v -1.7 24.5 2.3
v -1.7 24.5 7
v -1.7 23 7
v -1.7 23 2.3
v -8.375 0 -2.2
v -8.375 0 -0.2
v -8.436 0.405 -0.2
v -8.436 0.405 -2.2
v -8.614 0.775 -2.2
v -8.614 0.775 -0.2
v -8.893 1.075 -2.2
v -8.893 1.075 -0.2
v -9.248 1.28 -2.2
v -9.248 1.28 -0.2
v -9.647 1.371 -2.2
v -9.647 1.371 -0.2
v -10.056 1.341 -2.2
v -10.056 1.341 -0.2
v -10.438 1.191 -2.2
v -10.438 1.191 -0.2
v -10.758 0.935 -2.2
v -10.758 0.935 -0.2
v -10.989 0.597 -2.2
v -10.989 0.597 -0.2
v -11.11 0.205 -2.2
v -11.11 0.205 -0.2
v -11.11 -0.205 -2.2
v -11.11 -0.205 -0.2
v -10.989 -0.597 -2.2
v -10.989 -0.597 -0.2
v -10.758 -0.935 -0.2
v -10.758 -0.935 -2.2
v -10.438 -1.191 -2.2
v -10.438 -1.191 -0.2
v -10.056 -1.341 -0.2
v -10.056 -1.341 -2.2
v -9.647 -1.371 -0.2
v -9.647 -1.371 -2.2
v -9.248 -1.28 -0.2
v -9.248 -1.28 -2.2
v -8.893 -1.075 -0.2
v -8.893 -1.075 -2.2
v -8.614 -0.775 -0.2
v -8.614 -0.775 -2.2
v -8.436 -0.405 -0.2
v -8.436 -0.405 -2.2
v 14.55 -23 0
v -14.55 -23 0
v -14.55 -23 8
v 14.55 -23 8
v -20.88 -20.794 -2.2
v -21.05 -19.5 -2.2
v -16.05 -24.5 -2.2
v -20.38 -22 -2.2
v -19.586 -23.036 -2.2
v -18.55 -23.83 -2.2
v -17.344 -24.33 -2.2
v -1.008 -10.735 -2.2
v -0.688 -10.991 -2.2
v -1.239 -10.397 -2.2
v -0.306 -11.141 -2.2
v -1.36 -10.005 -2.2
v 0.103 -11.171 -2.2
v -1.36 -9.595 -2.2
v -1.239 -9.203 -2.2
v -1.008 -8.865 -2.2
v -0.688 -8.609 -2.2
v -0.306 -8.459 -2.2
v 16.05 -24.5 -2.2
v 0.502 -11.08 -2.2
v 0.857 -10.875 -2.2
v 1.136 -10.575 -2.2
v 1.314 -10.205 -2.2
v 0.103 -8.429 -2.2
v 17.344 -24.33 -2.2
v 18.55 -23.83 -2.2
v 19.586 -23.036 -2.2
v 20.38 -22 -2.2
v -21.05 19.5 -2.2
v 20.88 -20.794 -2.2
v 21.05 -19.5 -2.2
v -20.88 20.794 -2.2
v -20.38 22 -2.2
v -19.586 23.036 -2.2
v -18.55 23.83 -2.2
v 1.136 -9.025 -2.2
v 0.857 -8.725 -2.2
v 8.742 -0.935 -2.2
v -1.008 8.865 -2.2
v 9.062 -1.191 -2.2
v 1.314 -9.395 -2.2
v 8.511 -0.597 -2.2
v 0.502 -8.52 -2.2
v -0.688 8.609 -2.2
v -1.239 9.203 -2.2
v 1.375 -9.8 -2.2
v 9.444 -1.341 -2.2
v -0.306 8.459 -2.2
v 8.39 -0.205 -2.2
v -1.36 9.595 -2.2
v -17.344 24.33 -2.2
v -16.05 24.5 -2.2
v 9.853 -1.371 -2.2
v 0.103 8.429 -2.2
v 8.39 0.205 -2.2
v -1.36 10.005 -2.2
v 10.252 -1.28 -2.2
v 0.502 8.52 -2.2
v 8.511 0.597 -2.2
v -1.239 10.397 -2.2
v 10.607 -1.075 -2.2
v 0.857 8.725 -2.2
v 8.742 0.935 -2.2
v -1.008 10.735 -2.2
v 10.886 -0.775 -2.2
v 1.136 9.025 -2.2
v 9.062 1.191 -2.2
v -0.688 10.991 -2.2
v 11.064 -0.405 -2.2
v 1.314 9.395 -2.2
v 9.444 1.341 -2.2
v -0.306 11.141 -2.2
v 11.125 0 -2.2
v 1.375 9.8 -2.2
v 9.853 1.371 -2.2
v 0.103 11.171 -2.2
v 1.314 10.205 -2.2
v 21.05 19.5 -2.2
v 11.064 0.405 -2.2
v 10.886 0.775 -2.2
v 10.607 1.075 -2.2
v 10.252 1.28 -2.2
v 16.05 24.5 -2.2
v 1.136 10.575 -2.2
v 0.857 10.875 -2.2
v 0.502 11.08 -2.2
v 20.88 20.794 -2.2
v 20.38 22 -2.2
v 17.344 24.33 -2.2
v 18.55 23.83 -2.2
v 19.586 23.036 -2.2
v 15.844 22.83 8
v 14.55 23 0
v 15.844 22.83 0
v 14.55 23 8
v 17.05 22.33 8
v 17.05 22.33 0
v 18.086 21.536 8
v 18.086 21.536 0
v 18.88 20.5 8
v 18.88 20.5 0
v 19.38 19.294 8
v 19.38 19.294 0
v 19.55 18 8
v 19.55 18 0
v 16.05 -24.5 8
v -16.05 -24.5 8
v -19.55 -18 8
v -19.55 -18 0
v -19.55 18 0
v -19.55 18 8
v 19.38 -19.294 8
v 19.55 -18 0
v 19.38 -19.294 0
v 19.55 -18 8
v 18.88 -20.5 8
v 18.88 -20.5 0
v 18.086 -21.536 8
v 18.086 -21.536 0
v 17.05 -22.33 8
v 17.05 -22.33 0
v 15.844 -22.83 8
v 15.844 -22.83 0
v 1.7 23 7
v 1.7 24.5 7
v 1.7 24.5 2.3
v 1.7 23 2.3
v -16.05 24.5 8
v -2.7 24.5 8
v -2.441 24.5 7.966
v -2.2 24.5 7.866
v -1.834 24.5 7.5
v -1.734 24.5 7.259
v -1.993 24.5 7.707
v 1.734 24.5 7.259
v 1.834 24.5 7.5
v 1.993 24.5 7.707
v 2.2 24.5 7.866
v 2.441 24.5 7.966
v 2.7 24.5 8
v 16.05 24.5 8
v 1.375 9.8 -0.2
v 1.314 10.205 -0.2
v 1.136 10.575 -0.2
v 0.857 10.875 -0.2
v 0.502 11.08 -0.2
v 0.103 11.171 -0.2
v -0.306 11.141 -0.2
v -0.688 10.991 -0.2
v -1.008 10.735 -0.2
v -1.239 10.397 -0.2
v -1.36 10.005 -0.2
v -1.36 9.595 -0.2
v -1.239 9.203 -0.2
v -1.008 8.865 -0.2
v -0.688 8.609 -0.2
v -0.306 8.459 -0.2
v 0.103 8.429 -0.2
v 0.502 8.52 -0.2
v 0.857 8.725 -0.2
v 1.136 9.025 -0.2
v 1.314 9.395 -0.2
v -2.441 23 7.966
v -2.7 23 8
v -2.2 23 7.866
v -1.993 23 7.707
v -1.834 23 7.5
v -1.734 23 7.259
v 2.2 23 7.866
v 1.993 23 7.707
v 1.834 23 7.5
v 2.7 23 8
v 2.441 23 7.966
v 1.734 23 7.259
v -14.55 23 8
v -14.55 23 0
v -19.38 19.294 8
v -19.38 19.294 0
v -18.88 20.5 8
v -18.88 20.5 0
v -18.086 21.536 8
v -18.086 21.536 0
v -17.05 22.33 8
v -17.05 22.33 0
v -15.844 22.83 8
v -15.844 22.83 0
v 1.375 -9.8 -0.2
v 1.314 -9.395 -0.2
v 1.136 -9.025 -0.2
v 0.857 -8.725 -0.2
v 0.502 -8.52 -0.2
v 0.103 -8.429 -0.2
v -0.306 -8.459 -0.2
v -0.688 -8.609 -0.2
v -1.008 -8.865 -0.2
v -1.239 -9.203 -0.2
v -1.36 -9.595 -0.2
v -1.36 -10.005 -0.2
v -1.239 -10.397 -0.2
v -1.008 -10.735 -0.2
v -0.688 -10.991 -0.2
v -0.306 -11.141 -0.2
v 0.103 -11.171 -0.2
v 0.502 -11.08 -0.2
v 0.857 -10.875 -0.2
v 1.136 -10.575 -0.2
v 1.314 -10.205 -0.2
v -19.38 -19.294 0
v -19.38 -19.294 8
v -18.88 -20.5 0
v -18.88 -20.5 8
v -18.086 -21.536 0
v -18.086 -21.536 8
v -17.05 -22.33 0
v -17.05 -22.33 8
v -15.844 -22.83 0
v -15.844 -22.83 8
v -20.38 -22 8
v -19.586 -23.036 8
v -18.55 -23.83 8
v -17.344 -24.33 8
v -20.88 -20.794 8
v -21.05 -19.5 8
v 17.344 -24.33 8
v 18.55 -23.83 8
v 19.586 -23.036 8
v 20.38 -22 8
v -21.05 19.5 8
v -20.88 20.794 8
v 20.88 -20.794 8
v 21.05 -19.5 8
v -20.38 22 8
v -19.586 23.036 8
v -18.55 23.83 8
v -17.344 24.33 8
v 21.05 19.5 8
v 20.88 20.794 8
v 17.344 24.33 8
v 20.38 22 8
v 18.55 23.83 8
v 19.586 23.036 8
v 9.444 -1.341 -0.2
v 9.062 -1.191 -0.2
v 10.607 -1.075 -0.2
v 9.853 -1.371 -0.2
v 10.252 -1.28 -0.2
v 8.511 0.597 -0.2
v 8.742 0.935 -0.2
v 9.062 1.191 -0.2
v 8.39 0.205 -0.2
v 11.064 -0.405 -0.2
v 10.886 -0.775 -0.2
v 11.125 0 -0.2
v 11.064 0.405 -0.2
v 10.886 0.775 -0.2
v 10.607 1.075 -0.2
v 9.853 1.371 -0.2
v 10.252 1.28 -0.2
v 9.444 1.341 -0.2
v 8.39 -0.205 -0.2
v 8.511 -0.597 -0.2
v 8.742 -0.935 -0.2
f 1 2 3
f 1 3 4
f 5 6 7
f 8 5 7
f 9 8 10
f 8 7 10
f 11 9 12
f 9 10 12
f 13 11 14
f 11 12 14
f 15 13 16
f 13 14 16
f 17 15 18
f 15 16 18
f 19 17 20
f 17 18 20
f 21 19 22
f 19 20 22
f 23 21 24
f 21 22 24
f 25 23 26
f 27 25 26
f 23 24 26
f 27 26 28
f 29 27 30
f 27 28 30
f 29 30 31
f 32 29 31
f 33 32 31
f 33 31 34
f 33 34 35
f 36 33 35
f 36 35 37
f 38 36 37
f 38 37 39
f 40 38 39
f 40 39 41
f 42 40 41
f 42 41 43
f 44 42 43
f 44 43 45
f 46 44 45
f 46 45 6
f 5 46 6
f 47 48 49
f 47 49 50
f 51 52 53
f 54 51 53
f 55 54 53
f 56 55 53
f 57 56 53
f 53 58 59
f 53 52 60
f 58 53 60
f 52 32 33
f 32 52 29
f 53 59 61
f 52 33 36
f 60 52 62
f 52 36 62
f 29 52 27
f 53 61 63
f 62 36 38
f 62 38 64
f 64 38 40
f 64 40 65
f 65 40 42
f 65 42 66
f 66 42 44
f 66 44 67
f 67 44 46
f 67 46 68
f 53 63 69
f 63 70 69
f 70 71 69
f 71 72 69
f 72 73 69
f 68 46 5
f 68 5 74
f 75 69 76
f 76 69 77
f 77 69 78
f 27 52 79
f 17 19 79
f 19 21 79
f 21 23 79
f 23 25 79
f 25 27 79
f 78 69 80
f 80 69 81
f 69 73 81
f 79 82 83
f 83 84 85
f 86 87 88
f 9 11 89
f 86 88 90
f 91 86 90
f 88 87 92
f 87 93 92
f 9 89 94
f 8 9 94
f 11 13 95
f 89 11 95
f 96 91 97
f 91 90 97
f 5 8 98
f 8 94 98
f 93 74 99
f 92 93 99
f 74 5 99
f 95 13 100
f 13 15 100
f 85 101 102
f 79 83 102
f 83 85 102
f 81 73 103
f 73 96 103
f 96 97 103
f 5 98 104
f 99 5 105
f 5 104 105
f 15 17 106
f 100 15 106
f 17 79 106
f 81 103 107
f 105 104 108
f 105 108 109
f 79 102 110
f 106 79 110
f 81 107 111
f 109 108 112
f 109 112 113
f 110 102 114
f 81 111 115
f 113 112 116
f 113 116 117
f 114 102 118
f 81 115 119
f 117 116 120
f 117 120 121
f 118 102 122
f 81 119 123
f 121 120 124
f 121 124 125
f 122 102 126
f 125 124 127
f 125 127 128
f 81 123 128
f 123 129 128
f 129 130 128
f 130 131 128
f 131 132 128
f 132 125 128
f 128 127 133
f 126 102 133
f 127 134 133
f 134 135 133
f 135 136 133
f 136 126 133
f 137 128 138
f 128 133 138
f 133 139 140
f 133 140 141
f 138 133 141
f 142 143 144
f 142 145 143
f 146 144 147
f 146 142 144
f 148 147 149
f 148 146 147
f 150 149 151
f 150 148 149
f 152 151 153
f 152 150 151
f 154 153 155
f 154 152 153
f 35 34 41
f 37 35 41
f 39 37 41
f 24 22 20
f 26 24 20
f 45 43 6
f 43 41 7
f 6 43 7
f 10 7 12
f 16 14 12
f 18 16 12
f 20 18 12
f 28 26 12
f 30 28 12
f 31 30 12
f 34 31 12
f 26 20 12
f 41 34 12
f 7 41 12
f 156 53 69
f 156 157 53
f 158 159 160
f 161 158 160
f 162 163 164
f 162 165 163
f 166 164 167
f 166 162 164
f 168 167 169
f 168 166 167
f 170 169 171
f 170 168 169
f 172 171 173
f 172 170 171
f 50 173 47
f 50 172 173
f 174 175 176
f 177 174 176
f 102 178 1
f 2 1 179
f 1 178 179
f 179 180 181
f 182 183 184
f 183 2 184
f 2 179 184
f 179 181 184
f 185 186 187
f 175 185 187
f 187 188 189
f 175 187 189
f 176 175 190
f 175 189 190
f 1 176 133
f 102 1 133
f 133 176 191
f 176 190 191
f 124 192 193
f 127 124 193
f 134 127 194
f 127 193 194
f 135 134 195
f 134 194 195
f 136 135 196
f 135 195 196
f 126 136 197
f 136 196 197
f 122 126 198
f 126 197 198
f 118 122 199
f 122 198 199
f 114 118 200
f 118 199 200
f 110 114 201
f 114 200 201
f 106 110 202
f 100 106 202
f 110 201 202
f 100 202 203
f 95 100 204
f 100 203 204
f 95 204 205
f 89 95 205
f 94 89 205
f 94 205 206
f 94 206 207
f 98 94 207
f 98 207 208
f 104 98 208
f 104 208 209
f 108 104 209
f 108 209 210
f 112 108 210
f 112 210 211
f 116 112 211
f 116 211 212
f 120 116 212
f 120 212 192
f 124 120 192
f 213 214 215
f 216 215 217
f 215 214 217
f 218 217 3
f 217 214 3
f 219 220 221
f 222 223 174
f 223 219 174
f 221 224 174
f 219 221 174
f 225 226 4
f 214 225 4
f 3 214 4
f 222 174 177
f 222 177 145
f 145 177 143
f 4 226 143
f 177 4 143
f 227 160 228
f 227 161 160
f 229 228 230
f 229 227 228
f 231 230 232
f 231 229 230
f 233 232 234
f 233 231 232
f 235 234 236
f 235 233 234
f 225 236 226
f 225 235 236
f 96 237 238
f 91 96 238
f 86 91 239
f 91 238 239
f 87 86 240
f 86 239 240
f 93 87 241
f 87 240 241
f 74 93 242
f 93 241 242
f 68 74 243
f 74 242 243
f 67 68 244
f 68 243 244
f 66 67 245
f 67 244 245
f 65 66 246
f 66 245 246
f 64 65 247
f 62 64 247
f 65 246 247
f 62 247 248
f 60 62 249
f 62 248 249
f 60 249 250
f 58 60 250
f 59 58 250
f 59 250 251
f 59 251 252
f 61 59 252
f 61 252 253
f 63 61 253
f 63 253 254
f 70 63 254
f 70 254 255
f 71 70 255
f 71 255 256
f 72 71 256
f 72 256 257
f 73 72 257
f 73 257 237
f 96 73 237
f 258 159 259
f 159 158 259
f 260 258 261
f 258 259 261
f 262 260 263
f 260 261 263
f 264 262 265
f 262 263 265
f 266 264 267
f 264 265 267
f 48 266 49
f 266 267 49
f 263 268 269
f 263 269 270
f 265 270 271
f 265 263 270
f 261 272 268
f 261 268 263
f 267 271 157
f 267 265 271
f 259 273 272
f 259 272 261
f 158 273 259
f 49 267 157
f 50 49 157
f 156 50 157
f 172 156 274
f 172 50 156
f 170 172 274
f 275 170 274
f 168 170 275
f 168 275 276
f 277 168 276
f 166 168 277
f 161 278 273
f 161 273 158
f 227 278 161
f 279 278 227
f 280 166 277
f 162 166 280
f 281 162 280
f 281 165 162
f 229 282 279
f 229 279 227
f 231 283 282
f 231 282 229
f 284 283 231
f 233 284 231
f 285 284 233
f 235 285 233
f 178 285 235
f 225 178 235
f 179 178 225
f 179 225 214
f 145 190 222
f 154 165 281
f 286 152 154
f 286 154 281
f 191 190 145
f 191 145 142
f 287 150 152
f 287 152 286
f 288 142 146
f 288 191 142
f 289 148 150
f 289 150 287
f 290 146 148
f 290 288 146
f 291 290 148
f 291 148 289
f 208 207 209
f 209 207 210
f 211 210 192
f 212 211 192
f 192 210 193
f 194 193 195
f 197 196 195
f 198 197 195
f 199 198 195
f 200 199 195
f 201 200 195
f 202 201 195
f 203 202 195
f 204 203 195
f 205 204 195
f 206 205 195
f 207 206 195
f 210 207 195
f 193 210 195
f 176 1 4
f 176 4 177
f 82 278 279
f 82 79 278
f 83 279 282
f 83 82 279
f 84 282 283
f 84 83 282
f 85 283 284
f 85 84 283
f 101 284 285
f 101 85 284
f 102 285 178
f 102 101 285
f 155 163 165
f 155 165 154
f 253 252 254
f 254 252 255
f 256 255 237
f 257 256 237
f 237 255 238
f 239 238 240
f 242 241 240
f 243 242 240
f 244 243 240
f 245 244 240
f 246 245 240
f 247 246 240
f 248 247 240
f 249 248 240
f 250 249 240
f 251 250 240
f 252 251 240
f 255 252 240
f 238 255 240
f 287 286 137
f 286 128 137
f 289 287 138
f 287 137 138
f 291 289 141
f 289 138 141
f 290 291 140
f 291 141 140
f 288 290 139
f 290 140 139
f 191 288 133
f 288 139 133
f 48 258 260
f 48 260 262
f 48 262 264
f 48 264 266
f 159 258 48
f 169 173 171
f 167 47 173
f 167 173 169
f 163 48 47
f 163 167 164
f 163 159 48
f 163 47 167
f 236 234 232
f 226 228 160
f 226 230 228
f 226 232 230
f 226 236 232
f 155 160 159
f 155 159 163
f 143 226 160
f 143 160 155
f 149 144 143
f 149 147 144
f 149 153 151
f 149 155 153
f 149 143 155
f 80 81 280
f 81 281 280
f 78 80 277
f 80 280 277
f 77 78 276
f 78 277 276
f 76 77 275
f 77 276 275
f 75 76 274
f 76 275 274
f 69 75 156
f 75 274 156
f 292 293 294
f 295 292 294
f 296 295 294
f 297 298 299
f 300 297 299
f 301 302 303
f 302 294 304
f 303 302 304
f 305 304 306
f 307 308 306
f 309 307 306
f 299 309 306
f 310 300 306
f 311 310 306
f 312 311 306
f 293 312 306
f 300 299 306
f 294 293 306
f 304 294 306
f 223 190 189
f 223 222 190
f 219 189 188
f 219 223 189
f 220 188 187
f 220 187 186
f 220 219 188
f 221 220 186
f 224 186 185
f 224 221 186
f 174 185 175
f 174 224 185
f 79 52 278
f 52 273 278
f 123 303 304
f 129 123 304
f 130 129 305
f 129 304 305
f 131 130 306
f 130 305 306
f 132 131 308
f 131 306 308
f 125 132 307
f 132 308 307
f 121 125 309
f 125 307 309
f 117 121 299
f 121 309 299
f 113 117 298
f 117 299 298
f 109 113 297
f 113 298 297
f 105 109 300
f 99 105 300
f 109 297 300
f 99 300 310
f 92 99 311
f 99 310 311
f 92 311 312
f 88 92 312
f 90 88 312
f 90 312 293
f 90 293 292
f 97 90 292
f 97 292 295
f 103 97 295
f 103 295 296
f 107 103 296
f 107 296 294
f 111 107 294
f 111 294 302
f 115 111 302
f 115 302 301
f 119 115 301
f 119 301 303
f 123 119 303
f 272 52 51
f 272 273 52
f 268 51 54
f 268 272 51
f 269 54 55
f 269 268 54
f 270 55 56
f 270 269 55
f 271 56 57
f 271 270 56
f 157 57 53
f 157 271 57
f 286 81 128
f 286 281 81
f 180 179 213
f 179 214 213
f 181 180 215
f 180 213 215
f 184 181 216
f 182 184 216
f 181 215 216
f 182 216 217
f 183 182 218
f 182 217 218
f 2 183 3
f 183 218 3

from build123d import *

# Parameters (mm, degrees)
SKETCH1_W           = 42.1
SKETCH1_H           = 49
SKETCH1_W_2         = 39.1
SKETCH1_H_2         = 46
BOSS_EXTRUDE1_DEPTH = 8
SKETCH1_2_W         = 42.1
SKETCH1_2_H         = 49
BOSS_EXTRUDE2_DEPTH = 2.2
FILLET1_R           = 5
SKETCH2_W           = 3.4
SKETCH2_H           = 5.7
CUT_EXTRUDE1_DEPTH  = 1.5
FILLET2_R           = 1
SKETCH3_R           = 1.375
CUT_EXTRUDE2_DEPTH  = 2.2
SKETCH4_R           = 1.5
BOSS_EXTRUDE3_DEPTH = 0.2


with BuildPart() as part:
    # Sketch1 → Boss-Extrude1 (new body)
    with BuildSketch(Plane.XY):
        Rectangle(SKETCH1_W, SKETCH1_H)
        Rectangle(SKETCH1_W_2, SKETCH1_H_2, mode=Mode.SUBTRACT)
    extrude(amount=BOSS_EXTRUDE1_DEPTH)

    # Sketch1<2> → Boss-Extrude2 (add)
    with BuildSketch(Plane.XY):
        Rectangle(SKETCH1_2_W, SKETCH1_2_H)
    extrude(amount=-BOSS_EXTRUDE2_DEPTH)

    # Fillet1
    fillet1_edges = [part.edges().sort_by_distance(p)[0] for p in [
        (-19.55, 23, 4),
        (-19.55, -23, 4),
        (19.55, -23, 4),
        (19.55, 23, 4),
        (-21.05, 24.5, 2.9),
        (21.05, 24.5, 2.9),
        (21.05, -24.5, 2.9),
        (-21.05, -24.5, 2.9),
    ]]
    fillet(fillet1_edges, radius=FILLET1_R)

    # Sketch2 → Cut-Extrude1 (cut)
    with BuildSketch(Plane(origin=(0, 24.5, 0), x_dir=(1, 0, 0), z_dir=(0, 1, 0))):
        with Locations((0, -5.15)):
            Rectangle(SKETCH2_W, SKETCH2_H)
    extrude(amount=-CUT_EXTRUDE1_DEPTH, mode=Mode.SUBTRACT)

    # Fillet2
    fillet2_edges = [part.edges().sort_by_distance(p)[0] for p in [
        (1.7, 23.75, 8),
        (-1.7, 23.75, 8),
    ]]
    fillet(fillet2_edges, radius=FILLET2_R)

    # Sketch3 → Cut-Extrude2 (cut)
    with BuildSketch(Plane.XY):
        with Locations((0, 9.8)):
            Circle(SKETCH3_R)
        with Locations((-9.75, 0)):
            Circle(SKETCH3_R)
        with Locations((0, -9.8)):
            Circle(SKETCH3_R)
        with Locations((9.75, 0)):
            Circle(SKETCH3_R)
    extrude(amount=-CUT_EXTRUDE2_DEPTH, mode=Mode.SUBTRACT)

    # Sketch4 → Boss-Extrude3 (add)
    with BuildSketch(Plane.XY):
        with Locations((-9.75, 0)):
            Circle(SKETCH4_R)
        with Locations((0, 9.8)):
            Circle(SKETCH4_R)
        with Locations((9.75, 0)):
            Circle(SKETCH4_R)
        with Locations((0, -9.8)):
            Circle(SKETCH4_R)
    extrude(amount=-BOSS_EXTRUDE3_DEPTH)


solid = part.part
